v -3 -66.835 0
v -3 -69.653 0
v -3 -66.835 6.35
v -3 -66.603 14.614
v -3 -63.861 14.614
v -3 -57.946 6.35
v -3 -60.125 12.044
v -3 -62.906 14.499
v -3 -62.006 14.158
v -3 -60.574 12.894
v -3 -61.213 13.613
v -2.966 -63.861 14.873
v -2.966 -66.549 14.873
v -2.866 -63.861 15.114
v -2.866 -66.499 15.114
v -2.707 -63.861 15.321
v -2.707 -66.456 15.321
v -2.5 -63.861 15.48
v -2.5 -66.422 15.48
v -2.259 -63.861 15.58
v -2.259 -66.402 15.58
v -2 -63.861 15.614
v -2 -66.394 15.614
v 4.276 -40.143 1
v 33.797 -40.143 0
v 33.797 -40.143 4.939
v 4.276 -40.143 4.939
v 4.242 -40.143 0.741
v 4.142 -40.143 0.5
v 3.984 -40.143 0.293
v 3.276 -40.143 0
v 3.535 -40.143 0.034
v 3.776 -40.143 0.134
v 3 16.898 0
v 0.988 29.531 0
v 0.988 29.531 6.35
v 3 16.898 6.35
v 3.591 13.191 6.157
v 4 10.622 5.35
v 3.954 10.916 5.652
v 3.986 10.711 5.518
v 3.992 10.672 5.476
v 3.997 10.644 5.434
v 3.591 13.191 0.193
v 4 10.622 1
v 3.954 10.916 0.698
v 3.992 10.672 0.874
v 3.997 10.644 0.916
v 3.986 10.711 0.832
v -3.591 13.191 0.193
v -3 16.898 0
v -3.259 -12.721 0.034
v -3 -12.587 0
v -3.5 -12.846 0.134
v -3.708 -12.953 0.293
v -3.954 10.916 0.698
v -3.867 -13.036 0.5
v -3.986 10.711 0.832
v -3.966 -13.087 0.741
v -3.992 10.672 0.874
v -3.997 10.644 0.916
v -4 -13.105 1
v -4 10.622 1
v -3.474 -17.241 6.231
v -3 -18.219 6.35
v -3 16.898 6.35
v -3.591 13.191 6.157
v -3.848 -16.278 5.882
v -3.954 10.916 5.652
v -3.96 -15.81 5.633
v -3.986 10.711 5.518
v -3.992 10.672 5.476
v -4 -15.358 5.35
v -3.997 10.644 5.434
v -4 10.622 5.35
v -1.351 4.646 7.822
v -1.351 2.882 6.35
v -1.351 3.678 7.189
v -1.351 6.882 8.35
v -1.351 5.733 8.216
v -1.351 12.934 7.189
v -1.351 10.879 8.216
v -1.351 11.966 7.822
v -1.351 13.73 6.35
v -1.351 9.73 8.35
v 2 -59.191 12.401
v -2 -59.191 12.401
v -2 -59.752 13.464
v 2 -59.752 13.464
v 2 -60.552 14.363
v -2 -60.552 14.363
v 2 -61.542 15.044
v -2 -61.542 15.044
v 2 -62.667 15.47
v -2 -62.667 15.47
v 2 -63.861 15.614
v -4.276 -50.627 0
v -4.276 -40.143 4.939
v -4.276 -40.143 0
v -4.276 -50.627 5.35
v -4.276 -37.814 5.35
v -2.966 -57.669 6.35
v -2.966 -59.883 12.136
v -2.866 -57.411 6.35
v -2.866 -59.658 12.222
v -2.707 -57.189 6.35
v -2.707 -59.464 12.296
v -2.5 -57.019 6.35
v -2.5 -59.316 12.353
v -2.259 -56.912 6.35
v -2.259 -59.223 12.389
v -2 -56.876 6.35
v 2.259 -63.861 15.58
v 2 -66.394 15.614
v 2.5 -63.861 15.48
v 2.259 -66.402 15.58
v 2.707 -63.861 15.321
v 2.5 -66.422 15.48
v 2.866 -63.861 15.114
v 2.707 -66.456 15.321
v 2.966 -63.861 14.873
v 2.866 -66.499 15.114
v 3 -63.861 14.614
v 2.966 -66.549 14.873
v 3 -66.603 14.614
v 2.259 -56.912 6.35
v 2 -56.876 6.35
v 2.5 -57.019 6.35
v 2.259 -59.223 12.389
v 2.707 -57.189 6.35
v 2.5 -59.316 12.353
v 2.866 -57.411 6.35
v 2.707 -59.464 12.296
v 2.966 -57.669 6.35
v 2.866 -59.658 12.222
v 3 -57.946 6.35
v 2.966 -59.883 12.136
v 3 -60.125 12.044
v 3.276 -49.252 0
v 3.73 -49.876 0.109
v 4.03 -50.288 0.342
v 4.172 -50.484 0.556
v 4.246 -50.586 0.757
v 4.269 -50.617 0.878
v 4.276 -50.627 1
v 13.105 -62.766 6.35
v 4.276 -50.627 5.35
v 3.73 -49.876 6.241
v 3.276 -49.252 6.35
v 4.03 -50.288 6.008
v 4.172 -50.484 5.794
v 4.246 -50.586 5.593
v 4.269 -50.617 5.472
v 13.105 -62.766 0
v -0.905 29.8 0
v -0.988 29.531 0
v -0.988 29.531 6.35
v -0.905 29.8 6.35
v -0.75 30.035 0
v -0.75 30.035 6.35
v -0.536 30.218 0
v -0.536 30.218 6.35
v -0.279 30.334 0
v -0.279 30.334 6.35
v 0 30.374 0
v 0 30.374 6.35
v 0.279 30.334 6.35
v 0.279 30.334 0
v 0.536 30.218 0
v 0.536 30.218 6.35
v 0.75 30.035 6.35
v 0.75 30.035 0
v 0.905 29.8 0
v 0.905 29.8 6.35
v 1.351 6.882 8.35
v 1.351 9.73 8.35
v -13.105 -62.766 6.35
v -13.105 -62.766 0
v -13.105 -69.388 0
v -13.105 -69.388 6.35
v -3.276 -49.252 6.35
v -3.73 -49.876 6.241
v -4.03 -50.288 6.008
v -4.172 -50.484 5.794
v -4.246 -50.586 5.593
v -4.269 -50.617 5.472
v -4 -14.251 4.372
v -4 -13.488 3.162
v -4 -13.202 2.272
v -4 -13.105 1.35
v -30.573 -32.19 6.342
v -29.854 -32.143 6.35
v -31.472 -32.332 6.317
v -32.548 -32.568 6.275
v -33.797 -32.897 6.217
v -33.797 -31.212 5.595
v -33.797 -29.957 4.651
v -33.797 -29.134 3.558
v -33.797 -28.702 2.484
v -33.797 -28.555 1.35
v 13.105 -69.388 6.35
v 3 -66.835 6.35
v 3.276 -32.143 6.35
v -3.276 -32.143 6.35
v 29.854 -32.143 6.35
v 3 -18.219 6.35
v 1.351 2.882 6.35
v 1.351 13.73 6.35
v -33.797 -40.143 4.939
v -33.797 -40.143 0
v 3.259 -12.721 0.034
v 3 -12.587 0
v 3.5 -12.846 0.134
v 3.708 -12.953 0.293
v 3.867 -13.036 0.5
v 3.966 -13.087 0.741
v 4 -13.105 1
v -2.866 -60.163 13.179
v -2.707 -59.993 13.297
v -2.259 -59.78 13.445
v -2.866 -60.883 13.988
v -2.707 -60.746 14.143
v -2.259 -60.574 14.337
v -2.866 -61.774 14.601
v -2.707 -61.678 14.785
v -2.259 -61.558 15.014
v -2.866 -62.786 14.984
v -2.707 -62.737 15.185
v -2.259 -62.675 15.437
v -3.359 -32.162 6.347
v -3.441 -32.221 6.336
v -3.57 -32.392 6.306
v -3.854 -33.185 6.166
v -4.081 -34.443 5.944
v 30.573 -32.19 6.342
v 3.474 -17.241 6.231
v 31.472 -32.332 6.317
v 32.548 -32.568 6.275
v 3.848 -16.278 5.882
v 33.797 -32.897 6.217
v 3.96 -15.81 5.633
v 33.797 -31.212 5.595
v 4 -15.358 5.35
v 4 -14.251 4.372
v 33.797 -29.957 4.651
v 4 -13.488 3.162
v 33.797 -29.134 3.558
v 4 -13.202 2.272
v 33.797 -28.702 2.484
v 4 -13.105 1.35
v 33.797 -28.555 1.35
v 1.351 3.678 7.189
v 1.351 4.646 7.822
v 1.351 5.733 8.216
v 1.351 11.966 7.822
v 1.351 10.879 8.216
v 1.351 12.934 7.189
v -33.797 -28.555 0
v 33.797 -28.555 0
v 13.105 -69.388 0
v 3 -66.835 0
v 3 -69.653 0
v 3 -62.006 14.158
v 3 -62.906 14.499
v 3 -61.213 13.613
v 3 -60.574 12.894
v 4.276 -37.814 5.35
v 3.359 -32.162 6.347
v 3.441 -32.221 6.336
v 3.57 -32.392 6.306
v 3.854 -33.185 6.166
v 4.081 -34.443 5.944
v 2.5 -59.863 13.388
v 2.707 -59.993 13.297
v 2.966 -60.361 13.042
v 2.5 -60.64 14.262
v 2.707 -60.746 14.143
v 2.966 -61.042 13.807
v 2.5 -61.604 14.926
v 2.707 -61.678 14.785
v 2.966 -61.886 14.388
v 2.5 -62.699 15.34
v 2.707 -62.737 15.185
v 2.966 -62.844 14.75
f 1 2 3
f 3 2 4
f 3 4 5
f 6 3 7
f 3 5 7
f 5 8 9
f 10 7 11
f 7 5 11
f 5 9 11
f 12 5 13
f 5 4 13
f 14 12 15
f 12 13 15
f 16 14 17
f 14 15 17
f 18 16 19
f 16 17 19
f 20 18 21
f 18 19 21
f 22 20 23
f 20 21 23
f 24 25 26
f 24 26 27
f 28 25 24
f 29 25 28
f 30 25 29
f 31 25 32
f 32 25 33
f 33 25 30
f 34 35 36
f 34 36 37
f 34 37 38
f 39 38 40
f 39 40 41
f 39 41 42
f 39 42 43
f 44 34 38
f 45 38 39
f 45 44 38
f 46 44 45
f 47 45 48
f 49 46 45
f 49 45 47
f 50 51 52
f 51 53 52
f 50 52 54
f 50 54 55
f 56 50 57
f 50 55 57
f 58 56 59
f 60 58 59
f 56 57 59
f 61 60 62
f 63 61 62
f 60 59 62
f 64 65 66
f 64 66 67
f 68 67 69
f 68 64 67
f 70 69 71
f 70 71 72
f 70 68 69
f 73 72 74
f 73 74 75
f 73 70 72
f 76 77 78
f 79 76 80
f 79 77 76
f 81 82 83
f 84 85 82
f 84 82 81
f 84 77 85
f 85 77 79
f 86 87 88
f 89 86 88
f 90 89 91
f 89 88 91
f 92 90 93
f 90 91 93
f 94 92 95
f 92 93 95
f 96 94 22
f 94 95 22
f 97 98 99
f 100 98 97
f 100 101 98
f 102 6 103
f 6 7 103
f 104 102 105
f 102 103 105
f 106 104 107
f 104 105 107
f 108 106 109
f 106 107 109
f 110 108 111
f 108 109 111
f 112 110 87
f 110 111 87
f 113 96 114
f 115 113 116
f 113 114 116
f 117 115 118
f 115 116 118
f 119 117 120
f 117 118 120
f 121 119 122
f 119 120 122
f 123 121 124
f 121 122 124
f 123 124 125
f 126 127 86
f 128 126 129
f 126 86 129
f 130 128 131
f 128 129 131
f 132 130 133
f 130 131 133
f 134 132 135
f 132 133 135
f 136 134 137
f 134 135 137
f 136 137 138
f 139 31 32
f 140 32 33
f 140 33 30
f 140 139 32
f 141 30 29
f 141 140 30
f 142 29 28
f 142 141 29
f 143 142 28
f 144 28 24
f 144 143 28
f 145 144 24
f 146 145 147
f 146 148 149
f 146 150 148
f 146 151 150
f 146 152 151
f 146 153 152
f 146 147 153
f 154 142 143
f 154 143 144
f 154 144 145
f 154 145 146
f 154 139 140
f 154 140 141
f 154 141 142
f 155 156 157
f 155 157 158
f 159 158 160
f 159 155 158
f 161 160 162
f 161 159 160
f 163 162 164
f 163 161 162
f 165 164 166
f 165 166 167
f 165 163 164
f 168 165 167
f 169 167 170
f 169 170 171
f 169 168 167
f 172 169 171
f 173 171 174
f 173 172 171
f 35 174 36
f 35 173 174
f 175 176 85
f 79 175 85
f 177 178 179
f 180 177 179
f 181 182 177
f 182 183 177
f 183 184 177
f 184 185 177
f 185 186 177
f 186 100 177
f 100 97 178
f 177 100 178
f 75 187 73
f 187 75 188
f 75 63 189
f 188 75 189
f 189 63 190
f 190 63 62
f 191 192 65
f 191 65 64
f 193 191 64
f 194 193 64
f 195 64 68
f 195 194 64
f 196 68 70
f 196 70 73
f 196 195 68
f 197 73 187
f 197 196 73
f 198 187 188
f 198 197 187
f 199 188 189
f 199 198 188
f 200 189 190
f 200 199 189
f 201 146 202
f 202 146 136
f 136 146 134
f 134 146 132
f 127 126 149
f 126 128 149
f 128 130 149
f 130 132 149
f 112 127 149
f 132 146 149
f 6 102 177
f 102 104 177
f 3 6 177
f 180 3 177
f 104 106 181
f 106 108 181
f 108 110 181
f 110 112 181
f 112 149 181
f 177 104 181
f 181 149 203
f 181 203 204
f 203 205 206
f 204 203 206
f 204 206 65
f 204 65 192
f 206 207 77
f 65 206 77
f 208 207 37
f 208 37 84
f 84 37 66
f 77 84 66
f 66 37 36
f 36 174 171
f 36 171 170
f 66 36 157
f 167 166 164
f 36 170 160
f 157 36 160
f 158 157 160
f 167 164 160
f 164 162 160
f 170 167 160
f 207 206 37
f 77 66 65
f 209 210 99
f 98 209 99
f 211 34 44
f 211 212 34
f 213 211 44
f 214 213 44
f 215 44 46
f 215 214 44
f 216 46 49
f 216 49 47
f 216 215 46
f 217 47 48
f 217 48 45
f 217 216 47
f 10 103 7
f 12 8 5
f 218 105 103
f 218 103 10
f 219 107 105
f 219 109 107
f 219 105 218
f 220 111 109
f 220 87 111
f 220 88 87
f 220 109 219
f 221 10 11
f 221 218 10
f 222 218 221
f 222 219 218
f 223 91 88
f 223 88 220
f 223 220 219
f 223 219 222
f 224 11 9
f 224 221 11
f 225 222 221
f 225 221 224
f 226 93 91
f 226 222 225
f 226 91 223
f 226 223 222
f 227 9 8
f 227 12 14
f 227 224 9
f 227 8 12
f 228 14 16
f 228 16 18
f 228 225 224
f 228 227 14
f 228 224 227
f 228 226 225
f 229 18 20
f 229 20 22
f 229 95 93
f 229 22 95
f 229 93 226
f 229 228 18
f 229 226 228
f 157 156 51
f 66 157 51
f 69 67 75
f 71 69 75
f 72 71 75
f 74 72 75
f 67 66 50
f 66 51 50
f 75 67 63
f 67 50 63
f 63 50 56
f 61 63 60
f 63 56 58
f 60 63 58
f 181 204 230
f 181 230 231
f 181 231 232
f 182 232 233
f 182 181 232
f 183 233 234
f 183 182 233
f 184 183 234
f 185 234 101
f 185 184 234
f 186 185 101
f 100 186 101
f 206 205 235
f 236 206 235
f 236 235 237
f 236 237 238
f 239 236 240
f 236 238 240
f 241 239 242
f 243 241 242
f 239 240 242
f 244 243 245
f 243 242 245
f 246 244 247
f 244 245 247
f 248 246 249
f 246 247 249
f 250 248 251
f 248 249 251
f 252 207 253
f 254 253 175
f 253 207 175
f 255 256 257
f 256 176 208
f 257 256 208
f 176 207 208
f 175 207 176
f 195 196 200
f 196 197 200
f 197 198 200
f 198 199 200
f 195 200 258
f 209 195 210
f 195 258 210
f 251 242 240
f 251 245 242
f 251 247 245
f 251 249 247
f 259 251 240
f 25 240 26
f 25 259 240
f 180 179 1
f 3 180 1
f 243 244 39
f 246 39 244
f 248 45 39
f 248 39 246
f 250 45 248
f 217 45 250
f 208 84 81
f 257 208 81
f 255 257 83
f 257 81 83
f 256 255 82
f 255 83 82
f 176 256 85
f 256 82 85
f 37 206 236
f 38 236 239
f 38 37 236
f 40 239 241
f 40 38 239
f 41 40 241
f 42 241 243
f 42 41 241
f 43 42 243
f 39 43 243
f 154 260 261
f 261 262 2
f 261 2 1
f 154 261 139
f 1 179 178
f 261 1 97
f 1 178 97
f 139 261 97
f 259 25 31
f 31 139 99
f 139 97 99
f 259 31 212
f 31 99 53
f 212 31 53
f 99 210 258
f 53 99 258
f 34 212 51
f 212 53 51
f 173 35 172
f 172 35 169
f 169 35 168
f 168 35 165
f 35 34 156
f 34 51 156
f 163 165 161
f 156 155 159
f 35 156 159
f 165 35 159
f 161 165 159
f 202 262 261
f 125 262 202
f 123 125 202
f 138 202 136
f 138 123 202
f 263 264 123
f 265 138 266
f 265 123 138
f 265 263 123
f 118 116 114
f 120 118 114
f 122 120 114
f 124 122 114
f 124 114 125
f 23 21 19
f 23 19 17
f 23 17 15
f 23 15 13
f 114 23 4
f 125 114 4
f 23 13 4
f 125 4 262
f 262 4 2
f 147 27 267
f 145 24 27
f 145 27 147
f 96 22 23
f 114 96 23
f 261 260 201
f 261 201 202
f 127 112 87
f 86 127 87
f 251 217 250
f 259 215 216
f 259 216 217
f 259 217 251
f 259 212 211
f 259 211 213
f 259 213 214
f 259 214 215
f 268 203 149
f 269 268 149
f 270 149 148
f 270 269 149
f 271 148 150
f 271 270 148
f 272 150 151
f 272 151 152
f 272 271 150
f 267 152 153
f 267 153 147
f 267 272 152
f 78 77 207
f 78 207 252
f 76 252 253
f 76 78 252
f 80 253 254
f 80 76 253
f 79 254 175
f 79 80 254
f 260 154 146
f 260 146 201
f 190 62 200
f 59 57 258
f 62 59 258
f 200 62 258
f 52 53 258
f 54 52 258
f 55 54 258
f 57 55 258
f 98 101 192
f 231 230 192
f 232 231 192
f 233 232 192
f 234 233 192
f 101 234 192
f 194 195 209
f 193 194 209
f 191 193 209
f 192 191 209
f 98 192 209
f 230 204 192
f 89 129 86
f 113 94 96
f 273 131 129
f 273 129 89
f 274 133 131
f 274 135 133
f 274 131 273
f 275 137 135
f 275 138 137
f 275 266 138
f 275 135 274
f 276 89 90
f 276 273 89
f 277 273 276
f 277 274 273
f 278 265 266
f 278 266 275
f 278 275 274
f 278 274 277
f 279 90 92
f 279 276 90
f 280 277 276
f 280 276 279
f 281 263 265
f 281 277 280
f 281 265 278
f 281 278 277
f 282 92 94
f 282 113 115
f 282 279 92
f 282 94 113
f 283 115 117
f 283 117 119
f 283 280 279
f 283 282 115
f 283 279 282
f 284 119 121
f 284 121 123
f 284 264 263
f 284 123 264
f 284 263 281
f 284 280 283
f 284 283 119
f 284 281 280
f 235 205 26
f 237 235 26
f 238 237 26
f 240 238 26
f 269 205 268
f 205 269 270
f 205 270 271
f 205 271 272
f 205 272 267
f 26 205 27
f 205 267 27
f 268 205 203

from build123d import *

# Parameters (mm, degrees)
F1_DEPTH      = 6.35
F2_W          = 1.3509193668
F2_H          = 10.8486381359
F3_DEPTH      = 2
F5_DEPTH      = 3
F7_R          = 5
F8_T1_DEPTH   = 22.7018387336
F9_T1_DEPTH   = 22.7018387336
F10_T1_DEPTH  = 37.7293119504
F11_T1_DEPTH  = 50.3092406281
F11_T3_DEPTH  = 50.3092406281
F11_T8_DEPTH  = 71.0975509994
F11_T13_DEPTH = 71.0975509994
F12_R         = 1
F13_R         = 1
F14_R         = 1
F15_R         = 1


# Not quite as in the source:
# - a fillet or chamfer that OpenCascade refuses, or shapes differently, is made with other operations: its cross-section is extruded or revolved along the edge and cut away or added


with BuildPart() as f1:
    # F0 (on Top) → F1 (new body)
    with BuildSketch(Plane.XY):
        Polygon((0, -66.0772249103), (0, 35.7286036015), (-4.0004998446, 10.6220170856), (-4.0004998446, -13.1050860509), (-33.7973274291, -28.5552926362), (-33.7973274291, -40.1429459453), (-4.2763971724, -40.1429459453), (-4.2763971724, -50.6270192564), (-13.1050860509, -62.766470015), (-13.1050860509, -69.3879872561), align=None)
    extrude(amount=F1_DEPTH)

    # F2 (on face) → F3 (join)
    with BuildSketch(Plane.XY.offset(6.35)):
        with Locations((-0.6754596834, 8.3060876932)):
            Rectangle(F2_W, F2_H)
    extrude(amount=F3_DEPTH)

    # F4 (on Right) → F5 (join)
    with BuildSketch(Plane.YZ):
        with BuildLine():
            Line((-69.653019309, 0), (-54.4461198151, 0))
            Line((-54.4461198151, 0), (-59.1908343158, 12.4009543867))
            ThreePointArc((-59.1908343158, 12.4009543867), (-61.0264090525, 14.733305135), (-63.8606947699, 15.6142245978))
            Line((-63.8606947699, 15.6142245978), (-66.3944035769, 15.6142245978))
            Line((-66.3944035769, 15.6142245978), (-69.653019309, 0))
        make_face()
    extrude(amount=-F5_DEPTH)

    # F6: F1 across face


with BuildPart() as f1_1:
    add(f1.part)
    add(f1.part.mirror(Plane(origin=(0, -20.6881401181, 4.0270783), x_dir=(0, 1, 0), z_dir=(1, 0, 0))))

    # F7
    f7_edges = [f1_1.edges().sort_by_distance(p)[0] for p in [
        (-18.898914, -20.830189, 6.35),
        (18.898914, -20.830189, 6.35),
    ]]
    fillet(f7_edges, radius=F7_R)

    # F8: fillet of radius 5 on 1 edges, made by hand

    # F8_s2 → F8_t1 (cut)
    with BuildSketch(Plane.YZ.offset(-11.3509193668)):
        with BuildLine():
            ThreePointArc((13.7304067612, 6.35), (11.9664747387, 7.822135955), (9.7304067612, 8.35))
            Line((9.7304067612, 8.35), (13.7304067612, 8.35))
            Line((13.7304067612, 8.35), (13.7304067612, 6.35))
        make_face()
    extrude(amount=F8_T1_DEPTH, mode=Mode.SUBTRACT)

    # F9: fillet of radius 5 on 1 edges, made by hand

    # F9_s2 → F9_t1 (cut)
    with BuildSketch(Plane.YZ.offset(-11.3509193668)):
        with BuildLine():
            ThreePointArc((2.8817686252, 6.35), (4.6457006477, 7.822135955), (6.8817686252, 8.35))
            Line((6.8817686252, 8.35), (2.8817686252, 8.35))
            Line((2.8817686252, 8.35), (2.8817686252, 6.35))
        make_face()
    extrude(amount=F9_T1_DEPTH, mode=Mode.SUBTRACT)

    # F10: fillet of radius 1 on 1 edges, made by hand

    # F10_s2 → F10_t1 (cut)
    with BuildSketch(Plane.XY.offset(-15.6896559752)):
        with BuildLine():
            ThreePointArc((-0.9875420089, 29.5309258493), (0, 30.3735702625), (0.9875420089, 29.5309258493))
            Line((0.9875420089, 29.5309258493), (0, 35.7286036015))
            Line((0, 35.7286036015), (-0.9875420089, 29.5309258493))
        make_face()
    extrude(amount=F10_T1_DEPTH, mode=Mode.SUBTRACT)

    # F11: chamfer of 8 x 1.4106158457 on 2 edges, made by hand

    # F11_s2 → F11_t1 (cut)
    with BuildSketch(Plane.YZ.offset(-54.5856378004)):
        Polygon((-32.1429459453, 6.35), (-40.1429459453, 4.9393841543), (-40.1429459453, 6.35), align=None)
    extrude(amount=F11_T1_DEPTH, mode=Mode.SUBTRACT)

    # F11_s4 → F11_t3 (cut)
    with BuildSketch(Plane.YZ.offset(4.2763971724)):
        Polygon((-32.1429459453, 6.35), (-40.1429459453, 4.9393841543), (-40.1429459453, 6.35), align=None)
    extrude(amount=F11_T3_DEPTH, mode=Mode.SUBTRACT)


with BuildPart() as f11_tool6:
    # F11_s7 → F11_t8 (new body)
    with BuildSketch(Plane.YZ.offset(-54.5856378004)):
        Polygon((-32.1429459453, 6.35), (-40.1429459453, 4.9393841543), (-40.1429459453, 6.35), align=None)
    extrude(amount=F11_T8_DEPTH)

    split(bisect_by=Plane.YZ.offset(4.2763971724), keep=Keep.TOP)


with BuildPart() as f1_2:
    add(f1_1.part)

    # F11_t5: cut F11_tool6
    add(f11_tool6.part, mode=Mode.SUBTRACT)


with BuildPart() as f11_tool11:
    # F11_s12 → F11_t13 (new body)
    with BuildSketch(Plane.YZ.offset(54.5856378004)):
        Polygon((-32.1429459453, 6.35), (-40.1429459453, 4.9393841543), (-40.1429459453, 6.35), align=None)
    extrude(amount=-F11_T13_DEPTH)

    split(bisect_by=Plane.YZ.offset(-4.2763971724), keep=Keep.BOTTOM)


with BuildPart() as f1_3:
    add(f1_2.part)

    # F11_t10: cut F11_tool11
    add(f11_tool11.part, mode=Mode.SUBTRACT)

    # F12
    f12_edges = [f1_3.edges().sort_by_distance(p)[0] for p in [
        (-3, -58.03326, 9.375477),
    ]]
    fillet(f12_edges, radius=F12_R)

    # F13
    f13_edges = [f1_3.edges().sort_by_distance(p)[0] for p in [
        (3, -58.03326, 9.375477),
    ]]
    fillet(f13_edges, radius=F13_R)

    # F14
    f14_edges = [f1_3.edges().sort_by_distance(p)[0] for p in [
        (4.0005, -4.057628, 6.35),
        (-4.0005, -4.057628, 6.35),
        (-4.276397, -41.384983, 6.35),
        (4.276397, -41.384983, 6.35),
    ]]
    fillet(f14_edges, radius=F14_R)

    # F15
    f15_edges = [f1_3.edges().sort_by_distance(p)[0] for p in [
        (4.0005, -1.241534, 0),
        (-4.0005, -1.241534, 0),
        (4.276397, -45.384983, 0),
    ]]
    fillet(f15_edges, radius=F15_R)


solid = f1_3.part
